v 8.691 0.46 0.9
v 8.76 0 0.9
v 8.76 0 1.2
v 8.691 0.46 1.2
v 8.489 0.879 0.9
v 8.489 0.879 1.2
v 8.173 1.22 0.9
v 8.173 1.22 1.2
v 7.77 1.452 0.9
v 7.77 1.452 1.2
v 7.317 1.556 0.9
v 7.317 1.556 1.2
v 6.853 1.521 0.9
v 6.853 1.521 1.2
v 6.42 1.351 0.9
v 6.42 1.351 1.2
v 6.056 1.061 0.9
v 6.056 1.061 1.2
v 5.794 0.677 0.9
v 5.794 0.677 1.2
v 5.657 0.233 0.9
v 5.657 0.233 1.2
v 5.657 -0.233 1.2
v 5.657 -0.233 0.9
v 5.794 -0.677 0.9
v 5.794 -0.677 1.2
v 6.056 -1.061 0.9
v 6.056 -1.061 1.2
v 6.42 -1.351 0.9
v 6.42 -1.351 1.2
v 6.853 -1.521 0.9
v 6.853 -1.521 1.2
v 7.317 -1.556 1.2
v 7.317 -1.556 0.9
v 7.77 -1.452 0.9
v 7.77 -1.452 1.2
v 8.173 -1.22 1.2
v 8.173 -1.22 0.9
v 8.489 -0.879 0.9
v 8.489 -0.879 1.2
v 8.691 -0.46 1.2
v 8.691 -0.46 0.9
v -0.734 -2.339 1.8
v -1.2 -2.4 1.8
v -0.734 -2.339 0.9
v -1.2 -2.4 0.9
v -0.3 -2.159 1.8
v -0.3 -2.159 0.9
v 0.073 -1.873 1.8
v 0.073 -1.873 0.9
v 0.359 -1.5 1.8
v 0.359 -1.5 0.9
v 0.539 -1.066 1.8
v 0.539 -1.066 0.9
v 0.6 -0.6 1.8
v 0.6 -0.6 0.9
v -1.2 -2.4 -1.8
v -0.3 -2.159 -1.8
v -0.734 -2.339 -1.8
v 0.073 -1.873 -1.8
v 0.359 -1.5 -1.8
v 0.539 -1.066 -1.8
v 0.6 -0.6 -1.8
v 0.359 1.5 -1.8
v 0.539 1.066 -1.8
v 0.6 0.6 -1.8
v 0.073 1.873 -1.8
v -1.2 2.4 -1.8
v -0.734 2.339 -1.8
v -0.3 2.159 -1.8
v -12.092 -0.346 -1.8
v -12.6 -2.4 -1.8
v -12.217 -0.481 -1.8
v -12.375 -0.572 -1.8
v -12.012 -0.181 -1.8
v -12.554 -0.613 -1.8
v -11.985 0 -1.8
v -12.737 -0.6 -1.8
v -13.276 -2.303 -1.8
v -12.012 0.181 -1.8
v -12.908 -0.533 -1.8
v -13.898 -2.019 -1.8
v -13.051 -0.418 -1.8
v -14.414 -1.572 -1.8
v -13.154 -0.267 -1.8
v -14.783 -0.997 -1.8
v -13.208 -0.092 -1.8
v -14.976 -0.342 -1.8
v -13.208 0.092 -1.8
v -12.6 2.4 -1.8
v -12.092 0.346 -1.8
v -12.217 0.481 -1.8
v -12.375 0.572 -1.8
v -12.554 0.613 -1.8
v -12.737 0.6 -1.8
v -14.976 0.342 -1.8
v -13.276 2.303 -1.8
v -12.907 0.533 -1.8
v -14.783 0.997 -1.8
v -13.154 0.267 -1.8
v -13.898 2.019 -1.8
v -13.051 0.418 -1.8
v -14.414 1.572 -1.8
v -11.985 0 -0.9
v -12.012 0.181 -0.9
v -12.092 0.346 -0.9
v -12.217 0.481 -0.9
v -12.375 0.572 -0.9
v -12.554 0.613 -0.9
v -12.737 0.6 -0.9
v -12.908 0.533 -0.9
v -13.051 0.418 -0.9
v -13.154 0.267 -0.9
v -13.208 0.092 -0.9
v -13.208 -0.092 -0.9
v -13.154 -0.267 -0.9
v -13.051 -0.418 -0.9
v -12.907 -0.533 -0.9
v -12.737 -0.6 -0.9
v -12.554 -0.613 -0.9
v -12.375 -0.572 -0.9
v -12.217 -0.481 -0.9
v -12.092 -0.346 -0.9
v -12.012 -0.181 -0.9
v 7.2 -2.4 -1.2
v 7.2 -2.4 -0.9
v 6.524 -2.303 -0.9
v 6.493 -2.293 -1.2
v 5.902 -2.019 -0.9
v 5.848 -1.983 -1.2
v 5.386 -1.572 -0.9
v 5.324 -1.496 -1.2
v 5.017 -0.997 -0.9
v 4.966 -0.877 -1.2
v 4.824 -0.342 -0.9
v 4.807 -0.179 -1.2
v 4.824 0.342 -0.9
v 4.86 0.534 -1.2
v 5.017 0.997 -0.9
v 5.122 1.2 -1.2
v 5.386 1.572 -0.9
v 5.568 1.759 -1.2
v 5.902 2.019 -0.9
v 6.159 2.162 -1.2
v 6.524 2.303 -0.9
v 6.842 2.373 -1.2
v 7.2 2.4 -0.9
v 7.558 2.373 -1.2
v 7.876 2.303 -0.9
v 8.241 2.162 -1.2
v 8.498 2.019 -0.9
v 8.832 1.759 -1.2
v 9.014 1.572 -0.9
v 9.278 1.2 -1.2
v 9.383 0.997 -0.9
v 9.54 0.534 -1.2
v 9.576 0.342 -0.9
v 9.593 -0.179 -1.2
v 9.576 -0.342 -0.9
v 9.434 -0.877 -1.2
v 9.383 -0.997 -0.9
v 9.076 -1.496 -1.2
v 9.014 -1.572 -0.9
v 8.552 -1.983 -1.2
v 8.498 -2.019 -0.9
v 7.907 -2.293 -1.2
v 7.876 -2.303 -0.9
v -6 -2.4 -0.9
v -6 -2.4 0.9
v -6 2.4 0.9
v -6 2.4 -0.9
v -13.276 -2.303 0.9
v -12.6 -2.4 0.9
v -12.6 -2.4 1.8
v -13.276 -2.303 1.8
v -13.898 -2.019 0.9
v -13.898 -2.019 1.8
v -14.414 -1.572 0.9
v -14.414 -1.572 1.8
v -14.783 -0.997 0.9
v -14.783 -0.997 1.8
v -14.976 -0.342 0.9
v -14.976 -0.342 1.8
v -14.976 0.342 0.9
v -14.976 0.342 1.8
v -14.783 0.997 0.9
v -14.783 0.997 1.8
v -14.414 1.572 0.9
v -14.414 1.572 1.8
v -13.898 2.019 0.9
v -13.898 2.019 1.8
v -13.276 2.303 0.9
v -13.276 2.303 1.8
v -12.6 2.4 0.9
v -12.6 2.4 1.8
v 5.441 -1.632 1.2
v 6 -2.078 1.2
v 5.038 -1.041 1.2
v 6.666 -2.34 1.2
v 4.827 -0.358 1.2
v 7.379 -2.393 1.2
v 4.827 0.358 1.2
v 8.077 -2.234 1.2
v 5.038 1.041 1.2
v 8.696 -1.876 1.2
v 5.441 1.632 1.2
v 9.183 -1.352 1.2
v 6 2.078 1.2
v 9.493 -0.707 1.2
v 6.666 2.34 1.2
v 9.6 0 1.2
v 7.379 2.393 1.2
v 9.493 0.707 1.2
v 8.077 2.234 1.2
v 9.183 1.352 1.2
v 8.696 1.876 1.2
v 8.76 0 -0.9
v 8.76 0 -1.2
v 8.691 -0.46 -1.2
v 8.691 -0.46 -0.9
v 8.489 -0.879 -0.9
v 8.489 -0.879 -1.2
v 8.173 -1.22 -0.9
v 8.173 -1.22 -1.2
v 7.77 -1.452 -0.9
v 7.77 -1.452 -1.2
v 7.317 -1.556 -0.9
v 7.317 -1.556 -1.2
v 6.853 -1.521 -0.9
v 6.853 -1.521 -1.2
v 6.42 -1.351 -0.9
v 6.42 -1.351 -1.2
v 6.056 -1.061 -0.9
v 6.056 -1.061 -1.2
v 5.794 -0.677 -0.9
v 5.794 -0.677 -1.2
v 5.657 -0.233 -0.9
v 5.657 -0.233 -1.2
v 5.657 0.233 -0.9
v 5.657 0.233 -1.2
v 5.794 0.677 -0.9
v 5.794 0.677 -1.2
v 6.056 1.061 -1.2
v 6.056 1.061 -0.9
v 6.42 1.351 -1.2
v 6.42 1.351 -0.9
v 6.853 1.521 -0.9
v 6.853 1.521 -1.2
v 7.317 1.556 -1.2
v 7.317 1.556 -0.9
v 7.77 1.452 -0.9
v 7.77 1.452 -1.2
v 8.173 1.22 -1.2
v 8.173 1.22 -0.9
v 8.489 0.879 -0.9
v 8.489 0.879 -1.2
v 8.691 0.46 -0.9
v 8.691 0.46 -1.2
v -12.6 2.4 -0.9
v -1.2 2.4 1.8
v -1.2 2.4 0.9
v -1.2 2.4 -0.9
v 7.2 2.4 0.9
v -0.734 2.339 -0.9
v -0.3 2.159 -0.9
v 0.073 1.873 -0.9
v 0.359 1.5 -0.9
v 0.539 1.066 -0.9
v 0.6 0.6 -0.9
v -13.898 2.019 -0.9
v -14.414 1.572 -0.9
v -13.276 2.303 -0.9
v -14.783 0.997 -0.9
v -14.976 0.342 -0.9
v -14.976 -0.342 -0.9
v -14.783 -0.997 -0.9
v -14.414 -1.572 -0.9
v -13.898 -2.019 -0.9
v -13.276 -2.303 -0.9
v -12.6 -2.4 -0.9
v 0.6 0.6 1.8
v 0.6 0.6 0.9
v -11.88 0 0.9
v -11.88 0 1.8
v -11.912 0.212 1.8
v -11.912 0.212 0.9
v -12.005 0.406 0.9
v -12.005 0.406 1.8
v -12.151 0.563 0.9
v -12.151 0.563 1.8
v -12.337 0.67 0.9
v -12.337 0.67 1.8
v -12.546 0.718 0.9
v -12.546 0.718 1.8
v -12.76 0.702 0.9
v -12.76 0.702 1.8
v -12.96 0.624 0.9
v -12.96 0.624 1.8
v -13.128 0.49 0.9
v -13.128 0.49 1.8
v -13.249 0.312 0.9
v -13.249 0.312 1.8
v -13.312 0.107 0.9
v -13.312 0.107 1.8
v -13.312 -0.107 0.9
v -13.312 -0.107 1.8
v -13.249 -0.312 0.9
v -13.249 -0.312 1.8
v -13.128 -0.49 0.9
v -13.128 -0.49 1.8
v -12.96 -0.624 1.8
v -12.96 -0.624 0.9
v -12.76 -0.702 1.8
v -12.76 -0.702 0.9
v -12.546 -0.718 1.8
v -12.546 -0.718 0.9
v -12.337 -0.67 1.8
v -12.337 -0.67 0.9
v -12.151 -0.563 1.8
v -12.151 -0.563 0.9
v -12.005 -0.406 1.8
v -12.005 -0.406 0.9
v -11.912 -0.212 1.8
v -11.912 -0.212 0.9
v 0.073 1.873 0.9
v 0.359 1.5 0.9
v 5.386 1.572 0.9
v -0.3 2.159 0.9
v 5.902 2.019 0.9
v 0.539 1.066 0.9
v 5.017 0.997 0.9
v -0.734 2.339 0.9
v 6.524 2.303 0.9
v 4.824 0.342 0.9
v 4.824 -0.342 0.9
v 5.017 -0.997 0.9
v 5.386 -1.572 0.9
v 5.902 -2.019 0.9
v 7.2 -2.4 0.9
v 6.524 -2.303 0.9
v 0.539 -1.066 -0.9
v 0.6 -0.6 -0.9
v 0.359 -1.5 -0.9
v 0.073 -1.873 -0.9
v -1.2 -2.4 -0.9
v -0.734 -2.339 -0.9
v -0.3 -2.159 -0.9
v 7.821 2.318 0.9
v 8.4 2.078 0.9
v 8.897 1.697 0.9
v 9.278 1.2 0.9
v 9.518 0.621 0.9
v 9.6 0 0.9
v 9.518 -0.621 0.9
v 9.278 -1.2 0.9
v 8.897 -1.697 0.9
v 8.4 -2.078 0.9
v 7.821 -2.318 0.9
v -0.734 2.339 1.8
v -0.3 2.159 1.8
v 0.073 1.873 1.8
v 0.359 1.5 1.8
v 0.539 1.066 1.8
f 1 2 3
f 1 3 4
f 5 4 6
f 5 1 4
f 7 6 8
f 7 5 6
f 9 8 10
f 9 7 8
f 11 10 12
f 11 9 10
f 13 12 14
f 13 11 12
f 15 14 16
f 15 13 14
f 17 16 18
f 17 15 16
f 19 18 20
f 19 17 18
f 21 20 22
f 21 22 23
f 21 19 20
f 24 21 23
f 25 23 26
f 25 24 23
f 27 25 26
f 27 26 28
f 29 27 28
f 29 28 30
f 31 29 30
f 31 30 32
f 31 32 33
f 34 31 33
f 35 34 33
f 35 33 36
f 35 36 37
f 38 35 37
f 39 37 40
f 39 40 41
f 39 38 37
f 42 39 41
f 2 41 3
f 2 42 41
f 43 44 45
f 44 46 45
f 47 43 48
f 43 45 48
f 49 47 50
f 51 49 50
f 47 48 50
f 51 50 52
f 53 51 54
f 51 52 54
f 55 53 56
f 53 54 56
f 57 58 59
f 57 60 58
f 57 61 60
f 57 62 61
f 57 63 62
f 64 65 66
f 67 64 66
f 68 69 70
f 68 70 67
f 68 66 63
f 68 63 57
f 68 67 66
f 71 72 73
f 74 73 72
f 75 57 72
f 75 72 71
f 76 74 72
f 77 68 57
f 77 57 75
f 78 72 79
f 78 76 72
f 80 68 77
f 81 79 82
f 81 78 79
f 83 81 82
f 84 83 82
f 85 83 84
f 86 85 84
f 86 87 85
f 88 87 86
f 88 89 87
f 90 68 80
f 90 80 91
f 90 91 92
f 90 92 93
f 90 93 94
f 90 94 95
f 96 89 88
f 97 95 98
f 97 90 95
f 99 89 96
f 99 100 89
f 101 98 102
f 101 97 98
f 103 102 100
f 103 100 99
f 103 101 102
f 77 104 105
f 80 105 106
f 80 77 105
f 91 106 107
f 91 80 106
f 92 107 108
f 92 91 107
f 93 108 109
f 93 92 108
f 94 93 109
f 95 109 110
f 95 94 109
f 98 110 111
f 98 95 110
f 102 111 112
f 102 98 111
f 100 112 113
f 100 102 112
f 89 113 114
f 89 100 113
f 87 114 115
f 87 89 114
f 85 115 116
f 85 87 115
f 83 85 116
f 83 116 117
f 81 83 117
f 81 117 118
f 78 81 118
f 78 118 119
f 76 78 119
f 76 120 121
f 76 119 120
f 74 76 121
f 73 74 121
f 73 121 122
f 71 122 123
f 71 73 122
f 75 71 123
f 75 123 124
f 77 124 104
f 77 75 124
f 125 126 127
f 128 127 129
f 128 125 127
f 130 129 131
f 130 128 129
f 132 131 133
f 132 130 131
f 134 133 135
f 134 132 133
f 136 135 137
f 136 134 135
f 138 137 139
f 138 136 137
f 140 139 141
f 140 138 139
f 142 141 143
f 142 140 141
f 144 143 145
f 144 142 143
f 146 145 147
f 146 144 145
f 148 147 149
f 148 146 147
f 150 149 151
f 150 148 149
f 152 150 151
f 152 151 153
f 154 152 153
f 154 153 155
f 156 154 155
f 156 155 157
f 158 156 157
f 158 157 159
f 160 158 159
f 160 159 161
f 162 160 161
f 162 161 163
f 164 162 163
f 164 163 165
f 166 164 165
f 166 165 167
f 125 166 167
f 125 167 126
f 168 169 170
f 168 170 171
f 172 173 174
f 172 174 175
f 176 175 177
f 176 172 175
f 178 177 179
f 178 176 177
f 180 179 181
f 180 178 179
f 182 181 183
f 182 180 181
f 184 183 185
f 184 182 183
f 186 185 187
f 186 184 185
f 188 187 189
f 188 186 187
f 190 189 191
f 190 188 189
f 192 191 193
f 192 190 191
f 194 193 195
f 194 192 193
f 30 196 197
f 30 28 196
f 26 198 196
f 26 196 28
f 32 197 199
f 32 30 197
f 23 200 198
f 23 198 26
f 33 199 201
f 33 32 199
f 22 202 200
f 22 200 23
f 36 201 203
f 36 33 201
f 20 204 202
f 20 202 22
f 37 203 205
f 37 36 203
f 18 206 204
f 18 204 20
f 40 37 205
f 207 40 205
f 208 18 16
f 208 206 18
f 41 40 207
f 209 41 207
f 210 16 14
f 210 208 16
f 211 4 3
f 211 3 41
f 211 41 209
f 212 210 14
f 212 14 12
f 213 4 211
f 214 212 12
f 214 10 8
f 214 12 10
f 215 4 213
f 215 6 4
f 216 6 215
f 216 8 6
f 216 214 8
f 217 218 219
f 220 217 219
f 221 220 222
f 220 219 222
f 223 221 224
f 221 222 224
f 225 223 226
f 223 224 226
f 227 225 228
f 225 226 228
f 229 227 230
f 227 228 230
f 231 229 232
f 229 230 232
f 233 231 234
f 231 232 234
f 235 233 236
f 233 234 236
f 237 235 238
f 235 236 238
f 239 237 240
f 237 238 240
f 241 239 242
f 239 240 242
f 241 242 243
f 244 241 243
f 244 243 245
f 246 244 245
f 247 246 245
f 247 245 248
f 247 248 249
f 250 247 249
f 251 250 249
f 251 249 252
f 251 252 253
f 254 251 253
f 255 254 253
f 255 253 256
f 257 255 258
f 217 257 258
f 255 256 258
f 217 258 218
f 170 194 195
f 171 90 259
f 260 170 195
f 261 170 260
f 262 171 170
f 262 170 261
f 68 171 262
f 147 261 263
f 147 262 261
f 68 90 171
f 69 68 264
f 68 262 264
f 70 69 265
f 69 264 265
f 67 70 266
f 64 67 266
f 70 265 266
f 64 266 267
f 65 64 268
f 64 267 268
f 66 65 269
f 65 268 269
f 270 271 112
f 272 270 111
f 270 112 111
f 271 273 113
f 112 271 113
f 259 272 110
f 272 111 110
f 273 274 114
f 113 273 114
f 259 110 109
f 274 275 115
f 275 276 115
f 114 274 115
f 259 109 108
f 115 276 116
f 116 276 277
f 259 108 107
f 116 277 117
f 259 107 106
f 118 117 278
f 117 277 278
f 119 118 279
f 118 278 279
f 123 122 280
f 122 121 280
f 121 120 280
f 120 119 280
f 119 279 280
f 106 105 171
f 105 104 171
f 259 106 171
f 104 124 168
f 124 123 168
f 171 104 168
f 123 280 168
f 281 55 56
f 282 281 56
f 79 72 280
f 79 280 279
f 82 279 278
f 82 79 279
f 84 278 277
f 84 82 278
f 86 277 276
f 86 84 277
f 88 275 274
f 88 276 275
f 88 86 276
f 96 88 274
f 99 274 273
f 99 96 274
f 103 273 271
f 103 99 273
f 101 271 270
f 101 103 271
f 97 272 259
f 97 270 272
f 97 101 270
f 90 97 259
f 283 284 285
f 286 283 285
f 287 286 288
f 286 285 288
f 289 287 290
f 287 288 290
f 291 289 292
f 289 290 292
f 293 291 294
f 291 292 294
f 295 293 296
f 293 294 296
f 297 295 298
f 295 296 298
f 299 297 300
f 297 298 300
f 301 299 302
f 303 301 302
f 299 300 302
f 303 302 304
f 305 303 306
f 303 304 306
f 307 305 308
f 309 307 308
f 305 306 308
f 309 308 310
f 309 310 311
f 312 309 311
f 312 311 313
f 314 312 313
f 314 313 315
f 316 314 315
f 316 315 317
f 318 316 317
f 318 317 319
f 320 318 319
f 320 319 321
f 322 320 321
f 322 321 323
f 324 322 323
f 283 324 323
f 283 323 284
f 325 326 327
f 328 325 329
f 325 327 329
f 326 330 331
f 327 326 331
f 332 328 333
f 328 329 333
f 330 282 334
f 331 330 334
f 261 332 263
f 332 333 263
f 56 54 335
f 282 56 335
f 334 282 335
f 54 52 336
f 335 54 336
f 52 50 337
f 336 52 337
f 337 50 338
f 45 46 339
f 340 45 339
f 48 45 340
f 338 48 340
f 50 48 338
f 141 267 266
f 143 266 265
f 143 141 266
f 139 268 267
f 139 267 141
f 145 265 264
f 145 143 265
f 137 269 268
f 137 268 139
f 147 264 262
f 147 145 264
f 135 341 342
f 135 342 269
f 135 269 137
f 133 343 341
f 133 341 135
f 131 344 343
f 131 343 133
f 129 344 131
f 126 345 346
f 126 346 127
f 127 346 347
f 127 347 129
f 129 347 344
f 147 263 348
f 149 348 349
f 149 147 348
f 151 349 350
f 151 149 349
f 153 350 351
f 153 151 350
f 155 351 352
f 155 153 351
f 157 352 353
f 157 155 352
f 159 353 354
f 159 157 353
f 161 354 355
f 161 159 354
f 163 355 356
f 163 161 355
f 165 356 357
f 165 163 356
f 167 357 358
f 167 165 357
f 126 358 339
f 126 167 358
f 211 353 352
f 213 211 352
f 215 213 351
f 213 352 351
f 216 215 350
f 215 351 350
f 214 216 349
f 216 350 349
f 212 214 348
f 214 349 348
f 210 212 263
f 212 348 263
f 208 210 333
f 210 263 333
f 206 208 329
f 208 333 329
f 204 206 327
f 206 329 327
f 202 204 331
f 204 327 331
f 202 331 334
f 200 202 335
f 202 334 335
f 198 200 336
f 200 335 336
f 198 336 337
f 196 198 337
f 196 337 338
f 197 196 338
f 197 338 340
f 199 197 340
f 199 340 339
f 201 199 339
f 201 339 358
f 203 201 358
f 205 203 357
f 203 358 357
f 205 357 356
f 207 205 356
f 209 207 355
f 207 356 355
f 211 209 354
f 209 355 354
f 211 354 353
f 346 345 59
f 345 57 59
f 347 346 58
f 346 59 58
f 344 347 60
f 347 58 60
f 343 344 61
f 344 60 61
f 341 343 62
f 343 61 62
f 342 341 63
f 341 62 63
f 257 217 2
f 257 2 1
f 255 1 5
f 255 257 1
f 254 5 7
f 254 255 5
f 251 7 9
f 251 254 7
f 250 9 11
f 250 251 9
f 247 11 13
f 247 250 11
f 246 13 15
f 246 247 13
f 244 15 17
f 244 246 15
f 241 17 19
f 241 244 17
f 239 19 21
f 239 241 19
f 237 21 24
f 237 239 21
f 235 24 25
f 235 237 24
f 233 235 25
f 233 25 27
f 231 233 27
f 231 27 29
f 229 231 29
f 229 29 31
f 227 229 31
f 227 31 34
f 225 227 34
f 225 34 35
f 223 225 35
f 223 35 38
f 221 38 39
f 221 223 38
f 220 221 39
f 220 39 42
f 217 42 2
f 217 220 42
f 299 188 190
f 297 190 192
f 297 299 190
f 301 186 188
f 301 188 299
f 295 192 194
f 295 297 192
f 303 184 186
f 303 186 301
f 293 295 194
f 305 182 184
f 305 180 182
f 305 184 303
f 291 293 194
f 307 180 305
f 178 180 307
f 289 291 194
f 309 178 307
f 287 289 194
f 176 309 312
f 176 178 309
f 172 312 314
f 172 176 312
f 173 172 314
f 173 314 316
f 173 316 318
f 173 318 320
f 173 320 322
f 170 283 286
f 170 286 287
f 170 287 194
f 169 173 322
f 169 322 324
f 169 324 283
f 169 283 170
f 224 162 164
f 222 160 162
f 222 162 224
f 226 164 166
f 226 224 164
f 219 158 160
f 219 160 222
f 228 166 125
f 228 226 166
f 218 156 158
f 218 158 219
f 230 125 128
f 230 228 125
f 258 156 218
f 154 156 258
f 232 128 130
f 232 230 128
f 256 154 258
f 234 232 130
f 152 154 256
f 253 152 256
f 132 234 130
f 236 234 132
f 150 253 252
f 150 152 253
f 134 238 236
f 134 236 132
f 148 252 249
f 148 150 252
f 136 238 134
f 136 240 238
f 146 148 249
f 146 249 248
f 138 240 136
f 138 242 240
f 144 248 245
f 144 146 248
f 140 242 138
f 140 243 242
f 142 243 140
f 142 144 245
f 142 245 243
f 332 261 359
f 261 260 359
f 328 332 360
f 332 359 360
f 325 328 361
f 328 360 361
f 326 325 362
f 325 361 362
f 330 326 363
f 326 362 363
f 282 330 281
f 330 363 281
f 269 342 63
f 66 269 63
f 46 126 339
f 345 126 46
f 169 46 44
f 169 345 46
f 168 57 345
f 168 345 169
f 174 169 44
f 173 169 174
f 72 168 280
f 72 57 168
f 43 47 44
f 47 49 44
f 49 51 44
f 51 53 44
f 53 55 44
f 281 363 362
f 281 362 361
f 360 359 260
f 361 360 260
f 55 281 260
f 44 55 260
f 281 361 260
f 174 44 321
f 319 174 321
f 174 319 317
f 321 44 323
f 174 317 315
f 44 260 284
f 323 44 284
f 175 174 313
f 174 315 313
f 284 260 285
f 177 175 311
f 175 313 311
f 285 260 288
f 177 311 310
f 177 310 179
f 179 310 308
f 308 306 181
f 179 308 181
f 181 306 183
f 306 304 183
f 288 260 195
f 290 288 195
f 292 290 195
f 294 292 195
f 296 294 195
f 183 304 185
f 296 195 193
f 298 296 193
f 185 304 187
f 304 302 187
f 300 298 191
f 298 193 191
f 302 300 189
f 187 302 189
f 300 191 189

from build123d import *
from build123d.topology import SkipClean

# Parameters (mm, degrees)
EXTRUDE_1_DEPTH          = 3
EXTRUDE_1_DEPTH_BACK     = 3
SKETCH_1_R               = 1.025
SKETCH_1_R_2             = 2.6
CUT_EXTRUDE_1_DEPTH      = 10
CUT_EXTRUDE_1_DEPTH_BACK = 10
SKETCH_3_W               = 15
SKETCH_3_H               = 3
SKETCH_3_H_2             = 1.5
FILLET_1_R               = 3
SKETCH_4_R               = 4
SKETCH_4_R_2             = 2.6
EXTRUDE_2_DEPTH          = 0.5
EXTRUDE_START            = 0.5
SKETCH_5_R               = 2.6
EXTRUDE_3_DEPTH          = 0.5
SKETCH_6_R               = 1.2
CUT_EXTRUDE_2_DEPTH      = 2
SCALE_1_SCALE            = 0.6


with BuildPart() as part:
    # 草图1 → 凸台-拉伸1 (new, two sides: drawn at the far end of the back side and taken through both)
    with BuildSketch(Plane.XY.offset(-EXTRUDE_1_DEPTH_BACK)):
        with BuildLine():
            Line((-21, 4), (12, 4))
            ThreePointArc((12, 4), (16, 0), (12, -4))
            Line((12, -4), (-21, -4))
            ThreePointArc((-21, -4), (-25, 0), (-21, 4))
        make_face()
        with Locations((-21, 0)):
            Circle(SKETCH_1_R, mode=Mode.SUBTRACT)
        with Locations((12, 0)):
            Circle(SKETCH_1_R_2, mode=Mode.SUBTRACT)
    extrude(amount=EXTRUDE_1_DEPTH + EXTRUDE_1_DEPTH_BACK)

    # 草图3 → 切除-拉伸1 (cut, two sides: drawn at the far end of the back side and taken through both)
    with BuildSketch(Plane(origin=(0, 0, 0), x_dir=(1, 0, 0), z_dir=(0, 1, 0)).offset(-CUT_EXTRUDE_1_DEPTH_BACK)):
        with Locations((-17.5, 0)):
            Rectangle(SKETCH_3_W, SKETCH_3_H)
        with Locations((8.5, 2.25)):
            Rectangle(SKETCH_3_W, SKETCH_3_H_2)
        with Locations((8.5, -2.25)):
            Rectangle(SKETCH_3_W, SKETCH_3_H_2)
    extrude(amount=CUT_EXTRUDE_1_DEPTH + CUT_EXTRUDE_1_DEPTH_BACK, mode=Mode.SUBTRACT)

    # 圆角1
    fillet_1_edges = [part.edges().sort_by_distance(p)[0] for p in [
        (1, -4, 2.25),
        (1, 4, 2.25),
        (1, -4, -2.25),
        (1, 4, -2.25),
    ]]
    fillet(fillet_1_edges, radius=FILLET_1_R)

    # 草图4 → 凸台-拉伸2 (add)
    with SkipClean():  # the faces are left unmerged after this step: merging them gives an invalid solid
        with BuildSketch(Plane.XY.offset(1.5)):
            with Locations((12, 0)):
                Circle(SKETCH_4_R)
            with Locations((12, 0)):
                Circle(SKETCH_4_R_2, mode=Mode.SUBTRACT)
        extrude(amount=EXTRUDE_2_DEPTH)
    add(part.part.scale(1), mode=Mode.REPLACE)  # the faces are merged on a copy

    # 草图5 → 凸台-拉伸3 (add)
    with BuildSketch(Plane(origin=(0, 0, -1.5), x_dir=(-1, 0, 0), z_dir=(0, 0, -1)).offset(EXTRUDE_START)):
        with BuildLine():
            ThreePointArc((-12, 4), (-16, 0), (-12, -4))
            ThreePointArc((-12, -4), (-8, 0), (-12, 4))
        make_face()
        with Locations((-12, 0)):
            Circle(SKETCH_5_R, mode=Mode.SUBTRACT)
    extrude(amount=-EXTRUDE_3_DEPTH)

    # 草图6 → 切除-拉伸2 (cut)
    with BuildSketch(Plane.XY.offset(3)):
        with Locations((-21, 0)):
            Circle(SKETCH_6_R)
    extrude(amount=-CUT_EXTRUDE_2_DEPTH, mode=Mode.SUBTRACT)


with BuildPart() as part_1:
    # 缩放比例1: scaled about (0, 0, 0)
    add(part.part.scale(SCALE_1_SCALE))


solid = part_1.part
